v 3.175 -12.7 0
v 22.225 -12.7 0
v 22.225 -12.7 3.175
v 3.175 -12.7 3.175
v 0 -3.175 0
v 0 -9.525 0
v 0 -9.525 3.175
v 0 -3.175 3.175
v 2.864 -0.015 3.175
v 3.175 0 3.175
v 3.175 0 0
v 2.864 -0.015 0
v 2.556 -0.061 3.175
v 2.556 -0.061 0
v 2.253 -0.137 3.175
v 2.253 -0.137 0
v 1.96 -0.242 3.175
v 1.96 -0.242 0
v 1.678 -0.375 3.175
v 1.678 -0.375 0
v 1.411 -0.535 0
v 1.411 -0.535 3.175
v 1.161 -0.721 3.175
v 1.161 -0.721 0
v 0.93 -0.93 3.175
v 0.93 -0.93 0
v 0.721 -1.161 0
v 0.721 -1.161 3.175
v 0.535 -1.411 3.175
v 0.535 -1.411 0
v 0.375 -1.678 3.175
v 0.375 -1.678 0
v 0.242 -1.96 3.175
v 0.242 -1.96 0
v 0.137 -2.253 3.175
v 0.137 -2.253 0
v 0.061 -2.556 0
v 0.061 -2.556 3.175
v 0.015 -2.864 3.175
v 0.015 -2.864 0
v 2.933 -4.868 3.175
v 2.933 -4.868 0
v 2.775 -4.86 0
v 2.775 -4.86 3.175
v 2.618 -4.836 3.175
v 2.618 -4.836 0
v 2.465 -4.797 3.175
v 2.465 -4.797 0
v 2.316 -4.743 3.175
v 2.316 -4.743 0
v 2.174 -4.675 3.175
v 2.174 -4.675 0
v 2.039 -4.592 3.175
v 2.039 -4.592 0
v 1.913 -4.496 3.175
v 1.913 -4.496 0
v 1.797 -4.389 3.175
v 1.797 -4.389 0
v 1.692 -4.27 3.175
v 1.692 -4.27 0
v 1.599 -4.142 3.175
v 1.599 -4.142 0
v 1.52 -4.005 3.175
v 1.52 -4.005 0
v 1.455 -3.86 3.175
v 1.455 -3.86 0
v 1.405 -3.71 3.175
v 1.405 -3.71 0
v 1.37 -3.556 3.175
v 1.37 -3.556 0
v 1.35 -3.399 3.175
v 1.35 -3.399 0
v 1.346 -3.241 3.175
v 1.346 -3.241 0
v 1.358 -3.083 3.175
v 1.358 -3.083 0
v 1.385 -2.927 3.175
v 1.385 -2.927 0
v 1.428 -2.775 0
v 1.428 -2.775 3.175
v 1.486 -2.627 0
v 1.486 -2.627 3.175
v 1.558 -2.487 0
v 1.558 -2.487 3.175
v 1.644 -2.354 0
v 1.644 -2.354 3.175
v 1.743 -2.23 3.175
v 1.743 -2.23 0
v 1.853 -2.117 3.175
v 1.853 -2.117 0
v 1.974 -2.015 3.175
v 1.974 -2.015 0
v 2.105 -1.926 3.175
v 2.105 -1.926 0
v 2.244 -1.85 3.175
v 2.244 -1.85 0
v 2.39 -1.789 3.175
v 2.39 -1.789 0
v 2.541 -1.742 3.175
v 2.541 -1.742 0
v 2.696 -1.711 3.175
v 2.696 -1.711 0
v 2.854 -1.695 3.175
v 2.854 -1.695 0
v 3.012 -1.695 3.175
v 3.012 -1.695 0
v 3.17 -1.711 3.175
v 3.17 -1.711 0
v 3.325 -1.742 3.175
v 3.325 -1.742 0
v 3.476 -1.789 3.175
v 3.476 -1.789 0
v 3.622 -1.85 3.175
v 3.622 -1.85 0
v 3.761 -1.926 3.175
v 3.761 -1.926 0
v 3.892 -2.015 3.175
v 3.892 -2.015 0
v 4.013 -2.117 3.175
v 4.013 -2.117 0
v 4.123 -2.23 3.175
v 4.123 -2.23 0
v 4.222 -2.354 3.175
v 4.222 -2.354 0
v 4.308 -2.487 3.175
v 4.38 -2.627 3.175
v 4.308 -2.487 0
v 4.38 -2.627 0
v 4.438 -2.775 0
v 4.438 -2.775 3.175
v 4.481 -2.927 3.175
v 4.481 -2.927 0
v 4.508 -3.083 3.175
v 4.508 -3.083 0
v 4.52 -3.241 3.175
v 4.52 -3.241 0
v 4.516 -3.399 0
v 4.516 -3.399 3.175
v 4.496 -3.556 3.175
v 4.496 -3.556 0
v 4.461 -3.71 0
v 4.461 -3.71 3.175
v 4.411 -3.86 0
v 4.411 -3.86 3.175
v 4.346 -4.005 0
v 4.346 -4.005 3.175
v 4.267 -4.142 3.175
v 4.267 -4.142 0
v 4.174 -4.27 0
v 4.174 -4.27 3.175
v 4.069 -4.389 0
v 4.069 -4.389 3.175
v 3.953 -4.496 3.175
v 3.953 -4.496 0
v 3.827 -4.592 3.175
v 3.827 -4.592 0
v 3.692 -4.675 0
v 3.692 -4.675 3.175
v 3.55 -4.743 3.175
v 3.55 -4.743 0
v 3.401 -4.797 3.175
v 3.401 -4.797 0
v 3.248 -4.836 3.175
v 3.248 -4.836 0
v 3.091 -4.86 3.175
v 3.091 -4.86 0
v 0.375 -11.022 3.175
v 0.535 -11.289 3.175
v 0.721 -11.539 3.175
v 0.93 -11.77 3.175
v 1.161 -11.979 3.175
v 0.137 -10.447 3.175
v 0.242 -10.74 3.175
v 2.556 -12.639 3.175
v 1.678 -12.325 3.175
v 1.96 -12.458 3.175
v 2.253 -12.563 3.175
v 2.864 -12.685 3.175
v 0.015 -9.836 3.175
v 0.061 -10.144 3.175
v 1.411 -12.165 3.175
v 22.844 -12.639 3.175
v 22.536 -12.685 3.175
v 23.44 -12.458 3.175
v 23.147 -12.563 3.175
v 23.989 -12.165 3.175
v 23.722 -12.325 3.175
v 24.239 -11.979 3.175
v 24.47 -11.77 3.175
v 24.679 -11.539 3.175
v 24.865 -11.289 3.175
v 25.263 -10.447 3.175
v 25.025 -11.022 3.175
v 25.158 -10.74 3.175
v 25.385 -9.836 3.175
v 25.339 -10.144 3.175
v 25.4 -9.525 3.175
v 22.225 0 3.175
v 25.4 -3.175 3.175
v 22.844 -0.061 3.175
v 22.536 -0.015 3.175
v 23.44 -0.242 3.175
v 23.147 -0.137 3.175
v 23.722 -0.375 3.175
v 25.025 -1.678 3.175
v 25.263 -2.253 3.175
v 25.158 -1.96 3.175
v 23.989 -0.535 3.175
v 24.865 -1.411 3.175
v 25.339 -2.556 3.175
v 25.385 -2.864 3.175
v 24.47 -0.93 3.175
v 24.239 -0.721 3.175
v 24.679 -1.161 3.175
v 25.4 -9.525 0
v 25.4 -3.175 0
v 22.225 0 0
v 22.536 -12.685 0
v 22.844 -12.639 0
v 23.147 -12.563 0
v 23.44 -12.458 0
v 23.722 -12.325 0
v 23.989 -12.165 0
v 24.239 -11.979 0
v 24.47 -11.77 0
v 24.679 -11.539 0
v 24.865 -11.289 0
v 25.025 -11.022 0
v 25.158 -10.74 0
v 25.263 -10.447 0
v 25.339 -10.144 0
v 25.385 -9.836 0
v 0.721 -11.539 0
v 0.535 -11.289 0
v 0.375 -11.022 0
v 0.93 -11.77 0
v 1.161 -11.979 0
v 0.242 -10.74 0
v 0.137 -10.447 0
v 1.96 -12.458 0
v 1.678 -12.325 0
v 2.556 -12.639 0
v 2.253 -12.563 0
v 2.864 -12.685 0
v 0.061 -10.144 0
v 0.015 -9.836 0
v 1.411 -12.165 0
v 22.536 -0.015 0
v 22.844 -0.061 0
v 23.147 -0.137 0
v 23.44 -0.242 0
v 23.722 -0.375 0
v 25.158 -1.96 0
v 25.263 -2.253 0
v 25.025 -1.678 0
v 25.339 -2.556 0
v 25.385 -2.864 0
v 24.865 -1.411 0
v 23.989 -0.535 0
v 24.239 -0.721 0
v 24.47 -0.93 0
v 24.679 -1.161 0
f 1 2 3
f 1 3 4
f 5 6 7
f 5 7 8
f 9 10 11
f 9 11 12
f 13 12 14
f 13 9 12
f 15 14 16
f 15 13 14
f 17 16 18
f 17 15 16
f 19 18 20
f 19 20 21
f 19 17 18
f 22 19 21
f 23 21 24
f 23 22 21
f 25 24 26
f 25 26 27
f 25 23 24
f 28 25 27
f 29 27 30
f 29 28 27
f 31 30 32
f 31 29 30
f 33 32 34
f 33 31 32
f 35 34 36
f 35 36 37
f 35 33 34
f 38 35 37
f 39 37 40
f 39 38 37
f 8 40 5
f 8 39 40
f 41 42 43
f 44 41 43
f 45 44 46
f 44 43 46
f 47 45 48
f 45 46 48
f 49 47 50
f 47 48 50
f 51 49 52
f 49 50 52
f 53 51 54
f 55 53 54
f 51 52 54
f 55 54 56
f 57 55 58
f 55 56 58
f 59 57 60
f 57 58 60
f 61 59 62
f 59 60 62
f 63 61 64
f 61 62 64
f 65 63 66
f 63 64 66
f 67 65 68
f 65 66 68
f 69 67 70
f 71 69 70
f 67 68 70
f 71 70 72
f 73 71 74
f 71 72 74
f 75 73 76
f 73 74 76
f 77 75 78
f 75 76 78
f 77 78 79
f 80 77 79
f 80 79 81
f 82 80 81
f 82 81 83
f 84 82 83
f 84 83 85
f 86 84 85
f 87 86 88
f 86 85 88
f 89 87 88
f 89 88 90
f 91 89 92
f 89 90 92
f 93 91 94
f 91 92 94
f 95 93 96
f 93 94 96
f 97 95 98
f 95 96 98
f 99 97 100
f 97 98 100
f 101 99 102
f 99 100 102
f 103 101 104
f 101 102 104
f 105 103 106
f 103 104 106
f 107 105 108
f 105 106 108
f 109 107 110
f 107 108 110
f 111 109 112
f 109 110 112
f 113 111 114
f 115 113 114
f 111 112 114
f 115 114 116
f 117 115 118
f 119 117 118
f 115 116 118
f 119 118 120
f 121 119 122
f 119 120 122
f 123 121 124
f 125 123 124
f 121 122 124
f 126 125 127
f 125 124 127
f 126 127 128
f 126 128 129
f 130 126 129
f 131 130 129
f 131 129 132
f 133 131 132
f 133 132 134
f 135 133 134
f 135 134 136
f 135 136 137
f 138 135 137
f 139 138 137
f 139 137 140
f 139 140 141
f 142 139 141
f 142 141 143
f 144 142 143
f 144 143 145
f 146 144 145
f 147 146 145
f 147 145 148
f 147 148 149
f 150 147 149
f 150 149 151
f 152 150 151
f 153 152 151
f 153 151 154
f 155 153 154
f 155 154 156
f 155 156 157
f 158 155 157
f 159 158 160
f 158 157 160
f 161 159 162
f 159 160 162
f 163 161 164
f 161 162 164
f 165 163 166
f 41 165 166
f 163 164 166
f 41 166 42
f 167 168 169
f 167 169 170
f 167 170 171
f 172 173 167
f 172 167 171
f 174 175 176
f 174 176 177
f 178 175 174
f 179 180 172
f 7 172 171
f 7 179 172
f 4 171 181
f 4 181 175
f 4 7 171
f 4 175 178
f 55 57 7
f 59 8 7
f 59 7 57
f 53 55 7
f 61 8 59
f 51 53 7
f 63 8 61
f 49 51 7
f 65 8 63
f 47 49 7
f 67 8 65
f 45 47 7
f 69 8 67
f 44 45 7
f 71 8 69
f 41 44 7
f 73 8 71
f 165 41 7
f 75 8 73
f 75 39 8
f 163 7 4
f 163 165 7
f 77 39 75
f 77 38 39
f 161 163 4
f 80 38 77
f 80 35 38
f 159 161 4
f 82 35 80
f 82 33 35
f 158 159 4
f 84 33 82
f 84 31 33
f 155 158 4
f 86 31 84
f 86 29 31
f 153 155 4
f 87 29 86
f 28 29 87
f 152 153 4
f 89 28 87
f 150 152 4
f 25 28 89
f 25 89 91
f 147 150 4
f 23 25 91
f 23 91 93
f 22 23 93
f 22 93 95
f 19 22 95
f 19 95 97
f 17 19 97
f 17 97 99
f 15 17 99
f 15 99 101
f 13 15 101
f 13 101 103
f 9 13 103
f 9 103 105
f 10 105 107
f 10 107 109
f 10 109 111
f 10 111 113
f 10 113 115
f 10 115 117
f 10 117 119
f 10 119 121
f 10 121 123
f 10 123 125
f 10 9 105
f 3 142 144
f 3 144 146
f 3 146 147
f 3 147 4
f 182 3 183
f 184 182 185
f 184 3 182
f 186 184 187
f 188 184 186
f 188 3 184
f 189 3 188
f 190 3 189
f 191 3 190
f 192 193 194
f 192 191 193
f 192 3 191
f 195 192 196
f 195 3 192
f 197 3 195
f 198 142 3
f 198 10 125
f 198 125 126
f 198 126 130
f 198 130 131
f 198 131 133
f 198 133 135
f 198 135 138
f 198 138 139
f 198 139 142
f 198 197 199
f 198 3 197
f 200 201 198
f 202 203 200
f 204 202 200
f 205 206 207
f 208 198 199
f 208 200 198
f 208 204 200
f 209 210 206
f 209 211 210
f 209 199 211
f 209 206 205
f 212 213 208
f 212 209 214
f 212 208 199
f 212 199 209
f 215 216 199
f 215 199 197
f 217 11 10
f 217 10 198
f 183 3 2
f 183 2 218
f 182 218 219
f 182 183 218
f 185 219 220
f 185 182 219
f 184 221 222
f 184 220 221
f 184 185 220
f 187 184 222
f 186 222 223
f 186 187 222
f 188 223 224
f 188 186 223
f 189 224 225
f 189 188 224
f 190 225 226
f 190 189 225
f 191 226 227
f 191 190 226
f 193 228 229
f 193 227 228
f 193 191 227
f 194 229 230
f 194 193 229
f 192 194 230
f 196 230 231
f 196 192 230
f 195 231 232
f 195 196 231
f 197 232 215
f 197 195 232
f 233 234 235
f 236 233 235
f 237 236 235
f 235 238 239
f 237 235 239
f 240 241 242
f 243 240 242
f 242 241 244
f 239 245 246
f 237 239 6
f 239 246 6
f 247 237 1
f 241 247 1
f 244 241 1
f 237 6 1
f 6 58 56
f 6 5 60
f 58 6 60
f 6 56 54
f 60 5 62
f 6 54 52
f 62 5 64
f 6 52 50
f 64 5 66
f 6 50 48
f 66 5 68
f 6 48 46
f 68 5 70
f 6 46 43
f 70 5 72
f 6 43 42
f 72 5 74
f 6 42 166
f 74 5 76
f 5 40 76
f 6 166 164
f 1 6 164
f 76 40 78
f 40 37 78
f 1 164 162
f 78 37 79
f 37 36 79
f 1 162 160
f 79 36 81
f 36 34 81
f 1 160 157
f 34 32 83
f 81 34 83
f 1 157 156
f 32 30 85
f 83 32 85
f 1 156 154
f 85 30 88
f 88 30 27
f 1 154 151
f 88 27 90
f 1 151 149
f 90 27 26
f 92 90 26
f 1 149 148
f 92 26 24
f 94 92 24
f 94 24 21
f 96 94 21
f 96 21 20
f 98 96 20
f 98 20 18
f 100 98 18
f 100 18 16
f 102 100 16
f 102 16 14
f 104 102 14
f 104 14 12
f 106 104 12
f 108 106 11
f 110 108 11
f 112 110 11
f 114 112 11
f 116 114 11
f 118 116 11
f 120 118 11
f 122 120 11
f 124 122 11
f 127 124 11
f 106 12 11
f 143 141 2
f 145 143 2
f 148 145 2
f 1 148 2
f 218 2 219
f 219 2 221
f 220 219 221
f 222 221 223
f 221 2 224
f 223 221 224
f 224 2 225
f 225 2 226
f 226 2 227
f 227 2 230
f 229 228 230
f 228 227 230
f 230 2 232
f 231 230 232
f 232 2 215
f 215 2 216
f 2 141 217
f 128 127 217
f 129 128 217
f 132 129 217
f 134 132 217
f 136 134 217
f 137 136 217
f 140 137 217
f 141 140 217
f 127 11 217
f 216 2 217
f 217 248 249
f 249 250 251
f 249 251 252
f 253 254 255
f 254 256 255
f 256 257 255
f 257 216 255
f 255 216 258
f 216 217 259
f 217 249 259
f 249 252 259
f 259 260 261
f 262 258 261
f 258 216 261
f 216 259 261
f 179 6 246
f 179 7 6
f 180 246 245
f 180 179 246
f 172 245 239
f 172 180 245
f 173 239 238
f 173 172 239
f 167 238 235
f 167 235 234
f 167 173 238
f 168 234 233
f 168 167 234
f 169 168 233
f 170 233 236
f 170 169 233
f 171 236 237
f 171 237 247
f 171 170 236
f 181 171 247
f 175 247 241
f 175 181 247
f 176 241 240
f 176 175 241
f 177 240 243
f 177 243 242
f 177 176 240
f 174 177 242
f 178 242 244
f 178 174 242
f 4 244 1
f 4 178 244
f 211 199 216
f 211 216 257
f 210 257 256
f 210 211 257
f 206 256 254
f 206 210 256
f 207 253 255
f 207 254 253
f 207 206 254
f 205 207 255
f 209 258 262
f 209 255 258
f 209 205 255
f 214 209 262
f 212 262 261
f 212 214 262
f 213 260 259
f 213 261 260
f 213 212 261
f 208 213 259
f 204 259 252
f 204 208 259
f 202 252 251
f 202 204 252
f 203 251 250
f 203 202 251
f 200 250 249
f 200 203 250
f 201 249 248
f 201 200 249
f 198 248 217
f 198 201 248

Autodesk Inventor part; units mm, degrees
ref_plane "YZ Plane" through (0, 0, 0) normal (1, 0, 0) x (0, 1, 0)
ref_plane "XZ Plane" through (0, 0, 0) normal (0, 1, 0) x (-1, 0, 0)
ref_plane "XY Plane" through (0, 0, 0) normal (0, 0, 1) x (1, 0, 0)
sketch "Sketch1" plane through (0, 0, 0) normal (0, 0, 1) x (1, 0, 0)
  line L0 (0, 0) -> (25.4, 0)
  line L1 (25.4, 0) -> (25.4, -12.7)
  line L2 (25.4, -12.7) -> (0, -12.7)
  line L3 (0, -12.7) -> (0, 0)
  dimension "d0" = 25.4
  dimension "d1" = 12.7
extrude "Extrusion1" add sketch "Sketch1" along normal blind 3.175
hole "Hole1" at (2.933, -3.2804, 3.175) direction (0, 0, -1) diameter 3.175 depth 3.175 tip angle 118
fillet "Fillet1" radius 3.175 4 edges at (25.4, 0, 1.5875) (0, 0, 1.5875) (0, -12.7, 1.5875) (25.4, -12.7, 1.5875)
properties part number "Keychain_Bowen"
